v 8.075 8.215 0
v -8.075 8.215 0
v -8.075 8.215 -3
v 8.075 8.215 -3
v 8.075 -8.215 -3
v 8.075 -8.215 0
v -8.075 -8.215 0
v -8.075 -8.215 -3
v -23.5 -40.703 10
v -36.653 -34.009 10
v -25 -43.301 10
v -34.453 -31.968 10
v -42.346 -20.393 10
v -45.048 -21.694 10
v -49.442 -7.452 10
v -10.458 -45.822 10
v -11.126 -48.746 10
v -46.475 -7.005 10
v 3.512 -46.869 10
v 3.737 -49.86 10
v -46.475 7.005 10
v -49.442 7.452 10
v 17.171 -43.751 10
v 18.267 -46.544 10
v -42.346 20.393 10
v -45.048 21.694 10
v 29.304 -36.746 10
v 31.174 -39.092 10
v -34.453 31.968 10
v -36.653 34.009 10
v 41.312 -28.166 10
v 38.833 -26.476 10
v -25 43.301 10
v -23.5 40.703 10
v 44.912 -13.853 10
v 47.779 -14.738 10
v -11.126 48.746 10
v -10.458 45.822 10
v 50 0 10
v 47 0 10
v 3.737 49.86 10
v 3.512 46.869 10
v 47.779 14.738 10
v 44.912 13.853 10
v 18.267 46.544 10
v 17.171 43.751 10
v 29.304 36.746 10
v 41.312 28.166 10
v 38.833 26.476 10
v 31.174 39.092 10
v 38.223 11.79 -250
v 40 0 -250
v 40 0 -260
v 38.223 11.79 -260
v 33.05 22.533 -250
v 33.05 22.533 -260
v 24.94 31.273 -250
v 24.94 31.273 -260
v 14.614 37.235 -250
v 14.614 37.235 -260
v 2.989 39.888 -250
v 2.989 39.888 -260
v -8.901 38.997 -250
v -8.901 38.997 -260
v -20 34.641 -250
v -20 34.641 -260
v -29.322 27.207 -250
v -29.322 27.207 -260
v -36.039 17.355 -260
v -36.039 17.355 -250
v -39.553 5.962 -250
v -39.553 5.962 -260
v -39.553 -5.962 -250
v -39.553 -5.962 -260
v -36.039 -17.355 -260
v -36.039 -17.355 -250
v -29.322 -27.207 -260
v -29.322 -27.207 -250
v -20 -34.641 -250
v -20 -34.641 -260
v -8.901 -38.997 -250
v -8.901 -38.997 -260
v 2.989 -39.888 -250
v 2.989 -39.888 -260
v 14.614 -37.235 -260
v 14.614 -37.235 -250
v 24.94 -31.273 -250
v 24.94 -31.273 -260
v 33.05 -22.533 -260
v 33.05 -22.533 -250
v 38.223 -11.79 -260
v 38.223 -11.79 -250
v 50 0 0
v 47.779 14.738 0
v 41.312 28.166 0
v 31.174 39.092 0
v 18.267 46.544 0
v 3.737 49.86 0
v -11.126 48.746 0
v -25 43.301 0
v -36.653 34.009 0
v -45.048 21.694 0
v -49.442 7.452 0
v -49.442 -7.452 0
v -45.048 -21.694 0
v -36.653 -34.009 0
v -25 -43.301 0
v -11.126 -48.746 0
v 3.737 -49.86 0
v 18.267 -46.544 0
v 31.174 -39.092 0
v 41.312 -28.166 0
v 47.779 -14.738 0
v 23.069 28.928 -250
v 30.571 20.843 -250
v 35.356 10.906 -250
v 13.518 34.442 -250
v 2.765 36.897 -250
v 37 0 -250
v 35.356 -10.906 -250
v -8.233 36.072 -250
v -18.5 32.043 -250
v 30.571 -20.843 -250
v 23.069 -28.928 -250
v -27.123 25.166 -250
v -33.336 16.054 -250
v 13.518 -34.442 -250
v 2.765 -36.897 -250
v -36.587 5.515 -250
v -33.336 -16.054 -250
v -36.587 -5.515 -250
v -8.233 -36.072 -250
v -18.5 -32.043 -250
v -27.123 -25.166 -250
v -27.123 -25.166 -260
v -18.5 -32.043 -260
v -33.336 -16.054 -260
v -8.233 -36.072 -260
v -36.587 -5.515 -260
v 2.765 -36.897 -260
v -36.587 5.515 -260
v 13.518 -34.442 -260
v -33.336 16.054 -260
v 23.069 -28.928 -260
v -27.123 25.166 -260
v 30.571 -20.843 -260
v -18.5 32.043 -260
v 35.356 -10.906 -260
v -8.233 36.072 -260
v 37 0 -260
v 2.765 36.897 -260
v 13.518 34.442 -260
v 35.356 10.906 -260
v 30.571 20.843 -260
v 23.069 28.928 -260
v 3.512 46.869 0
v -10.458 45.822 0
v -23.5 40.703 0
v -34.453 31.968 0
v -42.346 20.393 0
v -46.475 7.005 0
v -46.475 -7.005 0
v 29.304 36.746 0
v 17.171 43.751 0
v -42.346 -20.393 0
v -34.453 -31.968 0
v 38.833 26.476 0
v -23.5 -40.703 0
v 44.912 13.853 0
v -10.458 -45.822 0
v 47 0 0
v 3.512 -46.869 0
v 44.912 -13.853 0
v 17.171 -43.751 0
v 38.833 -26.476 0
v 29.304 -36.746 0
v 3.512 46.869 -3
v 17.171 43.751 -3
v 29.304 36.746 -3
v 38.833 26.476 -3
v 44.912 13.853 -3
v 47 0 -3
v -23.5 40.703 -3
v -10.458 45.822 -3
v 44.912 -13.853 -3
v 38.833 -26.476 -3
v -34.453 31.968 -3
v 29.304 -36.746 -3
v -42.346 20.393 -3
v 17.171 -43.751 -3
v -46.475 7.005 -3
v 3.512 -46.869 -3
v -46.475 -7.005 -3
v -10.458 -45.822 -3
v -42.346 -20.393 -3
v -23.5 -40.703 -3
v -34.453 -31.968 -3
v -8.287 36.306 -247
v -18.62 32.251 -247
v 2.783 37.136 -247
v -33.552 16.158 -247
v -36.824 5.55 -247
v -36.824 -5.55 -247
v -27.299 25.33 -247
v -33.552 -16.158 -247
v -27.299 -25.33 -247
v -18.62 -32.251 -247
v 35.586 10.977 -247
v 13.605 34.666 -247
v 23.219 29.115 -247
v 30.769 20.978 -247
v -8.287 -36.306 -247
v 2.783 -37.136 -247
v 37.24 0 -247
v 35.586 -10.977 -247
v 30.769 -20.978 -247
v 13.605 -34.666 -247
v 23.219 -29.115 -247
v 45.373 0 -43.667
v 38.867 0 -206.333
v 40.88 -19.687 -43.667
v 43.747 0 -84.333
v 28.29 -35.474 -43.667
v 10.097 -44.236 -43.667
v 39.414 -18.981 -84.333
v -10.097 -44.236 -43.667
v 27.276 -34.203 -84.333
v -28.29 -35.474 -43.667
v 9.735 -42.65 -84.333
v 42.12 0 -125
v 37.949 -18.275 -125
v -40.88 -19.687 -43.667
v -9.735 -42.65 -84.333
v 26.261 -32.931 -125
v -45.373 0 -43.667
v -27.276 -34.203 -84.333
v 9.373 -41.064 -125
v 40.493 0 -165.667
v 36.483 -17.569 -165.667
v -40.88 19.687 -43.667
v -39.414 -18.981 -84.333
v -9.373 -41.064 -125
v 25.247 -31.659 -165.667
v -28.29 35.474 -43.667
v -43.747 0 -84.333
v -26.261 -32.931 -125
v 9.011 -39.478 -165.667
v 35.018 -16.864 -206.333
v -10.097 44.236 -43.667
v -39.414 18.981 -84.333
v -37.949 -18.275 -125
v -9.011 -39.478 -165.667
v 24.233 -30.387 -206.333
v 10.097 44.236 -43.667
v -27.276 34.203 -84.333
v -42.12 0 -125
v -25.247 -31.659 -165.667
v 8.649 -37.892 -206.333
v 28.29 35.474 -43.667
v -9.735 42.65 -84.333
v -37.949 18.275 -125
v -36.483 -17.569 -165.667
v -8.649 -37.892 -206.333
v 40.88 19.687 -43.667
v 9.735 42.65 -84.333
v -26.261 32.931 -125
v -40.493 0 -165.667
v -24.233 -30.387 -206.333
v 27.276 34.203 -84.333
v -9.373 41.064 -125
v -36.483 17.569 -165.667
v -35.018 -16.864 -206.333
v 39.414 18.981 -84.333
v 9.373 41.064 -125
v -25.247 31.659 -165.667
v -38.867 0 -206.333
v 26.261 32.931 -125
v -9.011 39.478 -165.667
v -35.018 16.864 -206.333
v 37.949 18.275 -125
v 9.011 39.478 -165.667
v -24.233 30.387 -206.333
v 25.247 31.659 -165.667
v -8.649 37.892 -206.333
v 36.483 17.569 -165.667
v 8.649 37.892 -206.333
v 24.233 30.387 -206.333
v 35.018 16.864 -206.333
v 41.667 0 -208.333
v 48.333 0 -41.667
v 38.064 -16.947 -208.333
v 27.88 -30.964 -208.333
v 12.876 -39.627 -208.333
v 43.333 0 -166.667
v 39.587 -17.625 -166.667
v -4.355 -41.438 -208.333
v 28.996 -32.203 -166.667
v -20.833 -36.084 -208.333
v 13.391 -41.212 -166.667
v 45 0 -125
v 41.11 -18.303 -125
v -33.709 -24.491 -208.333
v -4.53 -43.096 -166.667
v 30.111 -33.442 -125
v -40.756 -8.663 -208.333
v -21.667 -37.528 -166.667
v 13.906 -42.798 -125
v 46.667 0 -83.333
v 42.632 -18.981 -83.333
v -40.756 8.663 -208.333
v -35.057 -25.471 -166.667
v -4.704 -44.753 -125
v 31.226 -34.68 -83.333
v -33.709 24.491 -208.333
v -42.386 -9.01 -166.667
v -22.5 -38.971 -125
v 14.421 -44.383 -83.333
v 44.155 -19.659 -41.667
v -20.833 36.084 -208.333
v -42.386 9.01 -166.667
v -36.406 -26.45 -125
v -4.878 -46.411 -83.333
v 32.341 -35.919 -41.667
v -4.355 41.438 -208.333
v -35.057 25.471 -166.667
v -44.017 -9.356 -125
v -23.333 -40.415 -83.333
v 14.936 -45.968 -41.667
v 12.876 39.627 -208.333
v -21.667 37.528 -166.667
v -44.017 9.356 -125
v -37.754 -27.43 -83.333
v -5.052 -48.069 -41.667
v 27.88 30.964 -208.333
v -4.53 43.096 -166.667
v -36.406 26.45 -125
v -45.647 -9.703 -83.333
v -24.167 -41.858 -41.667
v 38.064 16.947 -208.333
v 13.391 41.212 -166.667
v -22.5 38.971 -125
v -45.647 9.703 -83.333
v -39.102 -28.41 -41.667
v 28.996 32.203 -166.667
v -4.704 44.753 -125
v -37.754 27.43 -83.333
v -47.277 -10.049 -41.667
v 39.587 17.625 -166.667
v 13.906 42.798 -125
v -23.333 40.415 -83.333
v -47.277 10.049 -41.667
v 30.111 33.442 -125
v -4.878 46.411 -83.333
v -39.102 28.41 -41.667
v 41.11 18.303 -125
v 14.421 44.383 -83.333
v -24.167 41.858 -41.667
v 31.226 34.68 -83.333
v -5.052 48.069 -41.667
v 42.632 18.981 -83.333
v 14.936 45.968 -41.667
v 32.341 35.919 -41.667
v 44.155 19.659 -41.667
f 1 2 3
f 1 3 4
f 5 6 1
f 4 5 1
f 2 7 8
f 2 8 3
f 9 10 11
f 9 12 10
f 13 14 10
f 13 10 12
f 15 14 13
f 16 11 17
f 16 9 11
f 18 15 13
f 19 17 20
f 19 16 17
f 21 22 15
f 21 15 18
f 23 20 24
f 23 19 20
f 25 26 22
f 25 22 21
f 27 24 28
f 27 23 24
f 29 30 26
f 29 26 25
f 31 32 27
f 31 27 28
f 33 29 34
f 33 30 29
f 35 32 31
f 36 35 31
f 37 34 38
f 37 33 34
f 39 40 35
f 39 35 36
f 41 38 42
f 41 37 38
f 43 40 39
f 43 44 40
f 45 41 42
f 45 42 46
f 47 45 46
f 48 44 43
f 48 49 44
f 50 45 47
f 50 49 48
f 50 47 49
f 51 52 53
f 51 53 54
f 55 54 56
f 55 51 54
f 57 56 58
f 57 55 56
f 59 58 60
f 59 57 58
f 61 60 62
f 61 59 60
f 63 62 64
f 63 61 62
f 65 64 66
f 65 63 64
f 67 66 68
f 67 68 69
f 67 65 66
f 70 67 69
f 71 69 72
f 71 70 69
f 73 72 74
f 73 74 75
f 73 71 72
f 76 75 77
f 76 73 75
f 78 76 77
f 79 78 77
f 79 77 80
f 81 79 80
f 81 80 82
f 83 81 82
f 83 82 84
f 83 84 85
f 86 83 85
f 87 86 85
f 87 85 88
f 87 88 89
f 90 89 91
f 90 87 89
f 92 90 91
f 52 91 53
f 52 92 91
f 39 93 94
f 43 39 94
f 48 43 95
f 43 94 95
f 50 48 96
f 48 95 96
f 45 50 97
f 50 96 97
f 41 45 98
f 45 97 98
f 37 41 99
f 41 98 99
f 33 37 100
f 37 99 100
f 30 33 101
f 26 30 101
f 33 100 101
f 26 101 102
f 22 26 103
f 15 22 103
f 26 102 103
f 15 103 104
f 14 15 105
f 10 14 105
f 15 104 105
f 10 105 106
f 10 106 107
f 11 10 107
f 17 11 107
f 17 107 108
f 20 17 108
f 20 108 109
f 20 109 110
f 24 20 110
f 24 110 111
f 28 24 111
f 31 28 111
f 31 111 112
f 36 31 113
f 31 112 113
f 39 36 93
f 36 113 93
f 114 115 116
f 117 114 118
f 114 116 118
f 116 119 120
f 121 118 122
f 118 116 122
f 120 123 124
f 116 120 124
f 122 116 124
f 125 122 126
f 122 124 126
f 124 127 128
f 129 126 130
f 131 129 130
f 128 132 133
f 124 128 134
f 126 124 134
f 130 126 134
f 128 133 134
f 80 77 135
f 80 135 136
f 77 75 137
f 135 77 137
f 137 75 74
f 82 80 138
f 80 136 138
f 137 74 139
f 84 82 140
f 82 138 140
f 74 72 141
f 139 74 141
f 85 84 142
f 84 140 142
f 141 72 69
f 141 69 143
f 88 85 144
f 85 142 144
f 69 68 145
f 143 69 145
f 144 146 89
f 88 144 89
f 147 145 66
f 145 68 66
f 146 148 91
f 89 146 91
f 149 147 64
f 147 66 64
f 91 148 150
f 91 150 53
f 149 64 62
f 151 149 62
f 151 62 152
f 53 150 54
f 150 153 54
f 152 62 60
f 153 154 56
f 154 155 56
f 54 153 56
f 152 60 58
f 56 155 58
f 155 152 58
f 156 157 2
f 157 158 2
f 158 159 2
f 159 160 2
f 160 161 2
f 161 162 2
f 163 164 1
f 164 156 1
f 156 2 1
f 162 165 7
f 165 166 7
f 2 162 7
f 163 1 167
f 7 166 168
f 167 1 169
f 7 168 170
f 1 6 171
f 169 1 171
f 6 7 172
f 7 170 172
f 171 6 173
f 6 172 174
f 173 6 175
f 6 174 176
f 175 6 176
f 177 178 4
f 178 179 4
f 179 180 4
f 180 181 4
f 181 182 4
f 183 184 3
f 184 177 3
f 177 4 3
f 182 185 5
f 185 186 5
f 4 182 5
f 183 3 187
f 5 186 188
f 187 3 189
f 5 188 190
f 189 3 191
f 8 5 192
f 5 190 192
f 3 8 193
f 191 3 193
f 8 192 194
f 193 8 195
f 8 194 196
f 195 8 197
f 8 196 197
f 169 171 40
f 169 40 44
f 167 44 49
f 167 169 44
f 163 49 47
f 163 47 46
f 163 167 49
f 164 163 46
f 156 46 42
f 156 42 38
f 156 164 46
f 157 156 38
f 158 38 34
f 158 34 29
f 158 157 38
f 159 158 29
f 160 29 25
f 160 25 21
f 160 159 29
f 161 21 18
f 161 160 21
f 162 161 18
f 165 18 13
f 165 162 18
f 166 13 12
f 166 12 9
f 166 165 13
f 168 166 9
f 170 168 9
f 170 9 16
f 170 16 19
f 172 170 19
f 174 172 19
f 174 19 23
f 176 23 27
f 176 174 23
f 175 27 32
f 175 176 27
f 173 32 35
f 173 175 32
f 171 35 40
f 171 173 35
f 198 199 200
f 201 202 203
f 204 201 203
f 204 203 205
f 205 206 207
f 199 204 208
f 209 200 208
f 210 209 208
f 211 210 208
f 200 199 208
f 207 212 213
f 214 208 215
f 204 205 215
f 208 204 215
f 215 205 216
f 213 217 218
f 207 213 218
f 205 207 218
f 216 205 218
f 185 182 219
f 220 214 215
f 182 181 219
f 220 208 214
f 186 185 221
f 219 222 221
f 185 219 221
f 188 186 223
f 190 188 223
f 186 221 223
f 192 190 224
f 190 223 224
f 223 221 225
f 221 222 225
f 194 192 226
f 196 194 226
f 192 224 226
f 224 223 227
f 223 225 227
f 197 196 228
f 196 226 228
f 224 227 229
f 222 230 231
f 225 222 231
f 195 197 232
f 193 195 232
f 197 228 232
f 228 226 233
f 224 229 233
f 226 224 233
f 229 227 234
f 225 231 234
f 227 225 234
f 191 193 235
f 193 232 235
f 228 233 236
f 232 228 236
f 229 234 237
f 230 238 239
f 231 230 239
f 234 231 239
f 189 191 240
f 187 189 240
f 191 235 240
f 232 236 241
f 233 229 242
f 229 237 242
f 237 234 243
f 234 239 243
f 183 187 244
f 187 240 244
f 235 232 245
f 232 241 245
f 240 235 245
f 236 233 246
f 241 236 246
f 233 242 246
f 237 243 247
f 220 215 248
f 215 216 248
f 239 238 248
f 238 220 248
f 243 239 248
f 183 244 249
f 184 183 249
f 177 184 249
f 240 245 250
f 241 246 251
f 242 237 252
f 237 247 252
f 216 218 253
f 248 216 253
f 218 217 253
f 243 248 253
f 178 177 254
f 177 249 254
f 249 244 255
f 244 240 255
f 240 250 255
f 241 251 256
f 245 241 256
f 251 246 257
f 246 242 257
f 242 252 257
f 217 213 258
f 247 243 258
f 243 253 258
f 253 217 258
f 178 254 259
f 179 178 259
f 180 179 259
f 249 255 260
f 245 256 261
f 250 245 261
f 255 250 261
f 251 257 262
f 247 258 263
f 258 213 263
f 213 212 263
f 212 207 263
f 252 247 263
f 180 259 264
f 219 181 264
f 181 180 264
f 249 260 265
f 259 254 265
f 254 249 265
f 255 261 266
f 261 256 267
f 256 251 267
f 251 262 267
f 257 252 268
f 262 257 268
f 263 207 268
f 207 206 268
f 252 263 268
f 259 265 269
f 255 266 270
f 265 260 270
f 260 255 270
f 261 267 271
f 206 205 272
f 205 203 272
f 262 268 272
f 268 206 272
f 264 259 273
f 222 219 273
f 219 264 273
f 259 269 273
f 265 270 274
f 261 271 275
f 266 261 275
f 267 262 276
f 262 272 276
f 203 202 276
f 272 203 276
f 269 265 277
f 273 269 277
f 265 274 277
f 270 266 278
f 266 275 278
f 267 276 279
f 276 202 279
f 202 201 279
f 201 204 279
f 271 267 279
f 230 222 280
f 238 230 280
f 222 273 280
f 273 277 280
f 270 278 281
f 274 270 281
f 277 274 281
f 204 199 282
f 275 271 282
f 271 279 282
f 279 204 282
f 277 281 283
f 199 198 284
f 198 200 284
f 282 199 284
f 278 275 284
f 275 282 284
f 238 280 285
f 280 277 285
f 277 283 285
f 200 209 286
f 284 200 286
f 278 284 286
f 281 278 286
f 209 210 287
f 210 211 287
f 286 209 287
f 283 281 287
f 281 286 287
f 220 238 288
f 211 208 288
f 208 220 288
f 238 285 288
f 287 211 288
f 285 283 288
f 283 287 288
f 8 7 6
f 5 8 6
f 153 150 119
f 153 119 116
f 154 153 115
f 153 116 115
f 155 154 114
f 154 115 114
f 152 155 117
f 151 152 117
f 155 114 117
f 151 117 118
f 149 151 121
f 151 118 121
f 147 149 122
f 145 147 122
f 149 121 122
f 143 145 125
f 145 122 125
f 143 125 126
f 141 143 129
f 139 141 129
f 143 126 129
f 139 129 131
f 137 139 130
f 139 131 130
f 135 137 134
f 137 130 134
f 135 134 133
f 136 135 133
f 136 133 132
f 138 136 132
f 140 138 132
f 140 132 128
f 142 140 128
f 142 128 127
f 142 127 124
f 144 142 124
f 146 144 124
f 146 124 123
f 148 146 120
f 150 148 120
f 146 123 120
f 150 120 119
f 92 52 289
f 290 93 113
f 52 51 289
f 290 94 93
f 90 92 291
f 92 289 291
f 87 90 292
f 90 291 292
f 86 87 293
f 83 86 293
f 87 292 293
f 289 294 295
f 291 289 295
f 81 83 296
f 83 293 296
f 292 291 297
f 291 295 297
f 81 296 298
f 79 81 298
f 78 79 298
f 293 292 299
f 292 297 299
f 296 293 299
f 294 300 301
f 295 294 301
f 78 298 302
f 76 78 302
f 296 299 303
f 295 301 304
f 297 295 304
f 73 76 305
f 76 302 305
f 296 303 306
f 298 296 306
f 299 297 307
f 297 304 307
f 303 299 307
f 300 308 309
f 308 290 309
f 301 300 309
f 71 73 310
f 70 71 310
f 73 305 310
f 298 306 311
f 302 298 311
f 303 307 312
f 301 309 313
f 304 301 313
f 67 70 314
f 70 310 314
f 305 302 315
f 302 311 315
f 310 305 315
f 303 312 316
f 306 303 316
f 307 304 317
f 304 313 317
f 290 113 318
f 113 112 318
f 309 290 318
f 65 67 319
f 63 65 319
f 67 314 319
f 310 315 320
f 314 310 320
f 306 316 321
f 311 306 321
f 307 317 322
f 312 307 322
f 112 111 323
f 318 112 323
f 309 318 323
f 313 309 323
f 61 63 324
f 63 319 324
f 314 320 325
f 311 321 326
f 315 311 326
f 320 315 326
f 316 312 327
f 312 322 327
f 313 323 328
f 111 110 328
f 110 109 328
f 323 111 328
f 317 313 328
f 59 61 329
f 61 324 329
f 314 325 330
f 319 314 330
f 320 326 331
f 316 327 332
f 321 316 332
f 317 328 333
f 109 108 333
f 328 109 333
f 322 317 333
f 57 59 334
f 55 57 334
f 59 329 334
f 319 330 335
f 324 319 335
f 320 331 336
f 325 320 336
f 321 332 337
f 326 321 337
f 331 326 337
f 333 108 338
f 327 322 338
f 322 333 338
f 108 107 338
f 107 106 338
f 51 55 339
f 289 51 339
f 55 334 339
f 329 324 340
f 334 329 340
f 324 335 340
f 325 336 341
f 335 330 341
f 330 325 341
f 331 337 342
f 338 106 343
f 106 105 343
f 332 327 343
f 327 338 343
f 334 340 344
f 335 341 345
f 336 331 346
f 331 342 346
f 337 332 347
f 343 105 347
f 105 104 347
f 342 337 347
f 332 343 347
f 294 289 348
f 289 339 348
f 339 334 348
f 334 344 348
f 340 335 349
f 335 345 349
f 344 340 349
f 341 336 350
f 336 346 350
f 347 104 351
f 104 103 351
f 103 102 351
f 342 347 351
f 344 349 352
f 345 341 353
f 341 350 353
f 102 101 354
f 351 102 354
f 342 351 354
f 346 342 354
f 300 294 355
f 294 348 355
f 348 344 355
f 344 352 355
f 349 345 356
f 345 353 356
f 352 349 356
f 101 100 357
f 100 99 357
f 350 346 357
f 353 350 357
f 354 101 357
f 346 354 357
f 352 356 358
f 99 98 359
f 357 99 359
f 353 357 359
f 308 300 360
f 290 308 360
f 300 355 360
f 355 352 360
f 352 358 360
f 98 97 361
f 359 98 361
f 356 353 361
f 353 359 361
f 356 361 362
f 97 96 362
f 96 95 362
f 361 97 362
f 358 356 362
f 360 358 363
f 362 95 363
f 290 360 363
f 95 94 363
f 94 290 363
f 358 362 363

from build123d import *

# Parameters (mm, degrees)
SKETCH2_R           = 50
SKETCH2_R_2         = 47
BOSS_EXTRUDE2_DEPTH = 10
SKETCH4_W           = 16.15
SKETCH4_H           = 16.43
CUT_EXTRUDE1_DEPTH  = 10
SKETCH3_R           = 40
SKETCH3_R_2         = 37
BOSS_EXTRUDE3_DEPTH = 10


with BuildPart() as part:
    # Sketch1 → Revolve1 (revolve)
    with BuildSketch(Plane(origin=(0, 0, 0), x_dir=(0, 0, -1), z_dir=(1, 0, 0)), mode=Mode.PRIVATE) as revolve1_sk:
        Polygon((0, 0), (3, 0), (3, 47), (247, 37.24), (247, 0), (250, 0), (250, 40), (0, 50), align=None)
    revolve(revolve1_sk.sketch.rotate(Axis((0, 0, 0), (0, 0, -1)), 90), axis=Axis((0, 0, 0), (0, 0, -1)))

    # Sketch2 → Boss-Extrude2 (add)
    with BuildSketch(Plane.XY):
        Circle(SKETCH2_R)
        Circle(SKETCH2_R_2, mode=Mode.SUBTRACT)
    extrude(amount=BOSS_EXTRUDE2_DEPTH)

    # Sketch4 → Cut-Extrude1 (cut)
    with BuildSketch(Plane.XY):
        Rectangle(SKETCH4_W, SKETCH4_H)
    extrude(amount=-CUT_EXTRUDE1_DEPTH, mode=Mode.SUBTRACT)

    # Sketch3 → Boss-Extrude3 (add)
    with BuildSketch(Plane.XY.offset(-250)):
        Circle(SKETCH3_R)
        Circle(SKETCH3_R_2, mode=Mode.SUBTRACT)
    extrude(amount=-BOSS_EXTRUDE3_DEPTH)


solid = part.part
